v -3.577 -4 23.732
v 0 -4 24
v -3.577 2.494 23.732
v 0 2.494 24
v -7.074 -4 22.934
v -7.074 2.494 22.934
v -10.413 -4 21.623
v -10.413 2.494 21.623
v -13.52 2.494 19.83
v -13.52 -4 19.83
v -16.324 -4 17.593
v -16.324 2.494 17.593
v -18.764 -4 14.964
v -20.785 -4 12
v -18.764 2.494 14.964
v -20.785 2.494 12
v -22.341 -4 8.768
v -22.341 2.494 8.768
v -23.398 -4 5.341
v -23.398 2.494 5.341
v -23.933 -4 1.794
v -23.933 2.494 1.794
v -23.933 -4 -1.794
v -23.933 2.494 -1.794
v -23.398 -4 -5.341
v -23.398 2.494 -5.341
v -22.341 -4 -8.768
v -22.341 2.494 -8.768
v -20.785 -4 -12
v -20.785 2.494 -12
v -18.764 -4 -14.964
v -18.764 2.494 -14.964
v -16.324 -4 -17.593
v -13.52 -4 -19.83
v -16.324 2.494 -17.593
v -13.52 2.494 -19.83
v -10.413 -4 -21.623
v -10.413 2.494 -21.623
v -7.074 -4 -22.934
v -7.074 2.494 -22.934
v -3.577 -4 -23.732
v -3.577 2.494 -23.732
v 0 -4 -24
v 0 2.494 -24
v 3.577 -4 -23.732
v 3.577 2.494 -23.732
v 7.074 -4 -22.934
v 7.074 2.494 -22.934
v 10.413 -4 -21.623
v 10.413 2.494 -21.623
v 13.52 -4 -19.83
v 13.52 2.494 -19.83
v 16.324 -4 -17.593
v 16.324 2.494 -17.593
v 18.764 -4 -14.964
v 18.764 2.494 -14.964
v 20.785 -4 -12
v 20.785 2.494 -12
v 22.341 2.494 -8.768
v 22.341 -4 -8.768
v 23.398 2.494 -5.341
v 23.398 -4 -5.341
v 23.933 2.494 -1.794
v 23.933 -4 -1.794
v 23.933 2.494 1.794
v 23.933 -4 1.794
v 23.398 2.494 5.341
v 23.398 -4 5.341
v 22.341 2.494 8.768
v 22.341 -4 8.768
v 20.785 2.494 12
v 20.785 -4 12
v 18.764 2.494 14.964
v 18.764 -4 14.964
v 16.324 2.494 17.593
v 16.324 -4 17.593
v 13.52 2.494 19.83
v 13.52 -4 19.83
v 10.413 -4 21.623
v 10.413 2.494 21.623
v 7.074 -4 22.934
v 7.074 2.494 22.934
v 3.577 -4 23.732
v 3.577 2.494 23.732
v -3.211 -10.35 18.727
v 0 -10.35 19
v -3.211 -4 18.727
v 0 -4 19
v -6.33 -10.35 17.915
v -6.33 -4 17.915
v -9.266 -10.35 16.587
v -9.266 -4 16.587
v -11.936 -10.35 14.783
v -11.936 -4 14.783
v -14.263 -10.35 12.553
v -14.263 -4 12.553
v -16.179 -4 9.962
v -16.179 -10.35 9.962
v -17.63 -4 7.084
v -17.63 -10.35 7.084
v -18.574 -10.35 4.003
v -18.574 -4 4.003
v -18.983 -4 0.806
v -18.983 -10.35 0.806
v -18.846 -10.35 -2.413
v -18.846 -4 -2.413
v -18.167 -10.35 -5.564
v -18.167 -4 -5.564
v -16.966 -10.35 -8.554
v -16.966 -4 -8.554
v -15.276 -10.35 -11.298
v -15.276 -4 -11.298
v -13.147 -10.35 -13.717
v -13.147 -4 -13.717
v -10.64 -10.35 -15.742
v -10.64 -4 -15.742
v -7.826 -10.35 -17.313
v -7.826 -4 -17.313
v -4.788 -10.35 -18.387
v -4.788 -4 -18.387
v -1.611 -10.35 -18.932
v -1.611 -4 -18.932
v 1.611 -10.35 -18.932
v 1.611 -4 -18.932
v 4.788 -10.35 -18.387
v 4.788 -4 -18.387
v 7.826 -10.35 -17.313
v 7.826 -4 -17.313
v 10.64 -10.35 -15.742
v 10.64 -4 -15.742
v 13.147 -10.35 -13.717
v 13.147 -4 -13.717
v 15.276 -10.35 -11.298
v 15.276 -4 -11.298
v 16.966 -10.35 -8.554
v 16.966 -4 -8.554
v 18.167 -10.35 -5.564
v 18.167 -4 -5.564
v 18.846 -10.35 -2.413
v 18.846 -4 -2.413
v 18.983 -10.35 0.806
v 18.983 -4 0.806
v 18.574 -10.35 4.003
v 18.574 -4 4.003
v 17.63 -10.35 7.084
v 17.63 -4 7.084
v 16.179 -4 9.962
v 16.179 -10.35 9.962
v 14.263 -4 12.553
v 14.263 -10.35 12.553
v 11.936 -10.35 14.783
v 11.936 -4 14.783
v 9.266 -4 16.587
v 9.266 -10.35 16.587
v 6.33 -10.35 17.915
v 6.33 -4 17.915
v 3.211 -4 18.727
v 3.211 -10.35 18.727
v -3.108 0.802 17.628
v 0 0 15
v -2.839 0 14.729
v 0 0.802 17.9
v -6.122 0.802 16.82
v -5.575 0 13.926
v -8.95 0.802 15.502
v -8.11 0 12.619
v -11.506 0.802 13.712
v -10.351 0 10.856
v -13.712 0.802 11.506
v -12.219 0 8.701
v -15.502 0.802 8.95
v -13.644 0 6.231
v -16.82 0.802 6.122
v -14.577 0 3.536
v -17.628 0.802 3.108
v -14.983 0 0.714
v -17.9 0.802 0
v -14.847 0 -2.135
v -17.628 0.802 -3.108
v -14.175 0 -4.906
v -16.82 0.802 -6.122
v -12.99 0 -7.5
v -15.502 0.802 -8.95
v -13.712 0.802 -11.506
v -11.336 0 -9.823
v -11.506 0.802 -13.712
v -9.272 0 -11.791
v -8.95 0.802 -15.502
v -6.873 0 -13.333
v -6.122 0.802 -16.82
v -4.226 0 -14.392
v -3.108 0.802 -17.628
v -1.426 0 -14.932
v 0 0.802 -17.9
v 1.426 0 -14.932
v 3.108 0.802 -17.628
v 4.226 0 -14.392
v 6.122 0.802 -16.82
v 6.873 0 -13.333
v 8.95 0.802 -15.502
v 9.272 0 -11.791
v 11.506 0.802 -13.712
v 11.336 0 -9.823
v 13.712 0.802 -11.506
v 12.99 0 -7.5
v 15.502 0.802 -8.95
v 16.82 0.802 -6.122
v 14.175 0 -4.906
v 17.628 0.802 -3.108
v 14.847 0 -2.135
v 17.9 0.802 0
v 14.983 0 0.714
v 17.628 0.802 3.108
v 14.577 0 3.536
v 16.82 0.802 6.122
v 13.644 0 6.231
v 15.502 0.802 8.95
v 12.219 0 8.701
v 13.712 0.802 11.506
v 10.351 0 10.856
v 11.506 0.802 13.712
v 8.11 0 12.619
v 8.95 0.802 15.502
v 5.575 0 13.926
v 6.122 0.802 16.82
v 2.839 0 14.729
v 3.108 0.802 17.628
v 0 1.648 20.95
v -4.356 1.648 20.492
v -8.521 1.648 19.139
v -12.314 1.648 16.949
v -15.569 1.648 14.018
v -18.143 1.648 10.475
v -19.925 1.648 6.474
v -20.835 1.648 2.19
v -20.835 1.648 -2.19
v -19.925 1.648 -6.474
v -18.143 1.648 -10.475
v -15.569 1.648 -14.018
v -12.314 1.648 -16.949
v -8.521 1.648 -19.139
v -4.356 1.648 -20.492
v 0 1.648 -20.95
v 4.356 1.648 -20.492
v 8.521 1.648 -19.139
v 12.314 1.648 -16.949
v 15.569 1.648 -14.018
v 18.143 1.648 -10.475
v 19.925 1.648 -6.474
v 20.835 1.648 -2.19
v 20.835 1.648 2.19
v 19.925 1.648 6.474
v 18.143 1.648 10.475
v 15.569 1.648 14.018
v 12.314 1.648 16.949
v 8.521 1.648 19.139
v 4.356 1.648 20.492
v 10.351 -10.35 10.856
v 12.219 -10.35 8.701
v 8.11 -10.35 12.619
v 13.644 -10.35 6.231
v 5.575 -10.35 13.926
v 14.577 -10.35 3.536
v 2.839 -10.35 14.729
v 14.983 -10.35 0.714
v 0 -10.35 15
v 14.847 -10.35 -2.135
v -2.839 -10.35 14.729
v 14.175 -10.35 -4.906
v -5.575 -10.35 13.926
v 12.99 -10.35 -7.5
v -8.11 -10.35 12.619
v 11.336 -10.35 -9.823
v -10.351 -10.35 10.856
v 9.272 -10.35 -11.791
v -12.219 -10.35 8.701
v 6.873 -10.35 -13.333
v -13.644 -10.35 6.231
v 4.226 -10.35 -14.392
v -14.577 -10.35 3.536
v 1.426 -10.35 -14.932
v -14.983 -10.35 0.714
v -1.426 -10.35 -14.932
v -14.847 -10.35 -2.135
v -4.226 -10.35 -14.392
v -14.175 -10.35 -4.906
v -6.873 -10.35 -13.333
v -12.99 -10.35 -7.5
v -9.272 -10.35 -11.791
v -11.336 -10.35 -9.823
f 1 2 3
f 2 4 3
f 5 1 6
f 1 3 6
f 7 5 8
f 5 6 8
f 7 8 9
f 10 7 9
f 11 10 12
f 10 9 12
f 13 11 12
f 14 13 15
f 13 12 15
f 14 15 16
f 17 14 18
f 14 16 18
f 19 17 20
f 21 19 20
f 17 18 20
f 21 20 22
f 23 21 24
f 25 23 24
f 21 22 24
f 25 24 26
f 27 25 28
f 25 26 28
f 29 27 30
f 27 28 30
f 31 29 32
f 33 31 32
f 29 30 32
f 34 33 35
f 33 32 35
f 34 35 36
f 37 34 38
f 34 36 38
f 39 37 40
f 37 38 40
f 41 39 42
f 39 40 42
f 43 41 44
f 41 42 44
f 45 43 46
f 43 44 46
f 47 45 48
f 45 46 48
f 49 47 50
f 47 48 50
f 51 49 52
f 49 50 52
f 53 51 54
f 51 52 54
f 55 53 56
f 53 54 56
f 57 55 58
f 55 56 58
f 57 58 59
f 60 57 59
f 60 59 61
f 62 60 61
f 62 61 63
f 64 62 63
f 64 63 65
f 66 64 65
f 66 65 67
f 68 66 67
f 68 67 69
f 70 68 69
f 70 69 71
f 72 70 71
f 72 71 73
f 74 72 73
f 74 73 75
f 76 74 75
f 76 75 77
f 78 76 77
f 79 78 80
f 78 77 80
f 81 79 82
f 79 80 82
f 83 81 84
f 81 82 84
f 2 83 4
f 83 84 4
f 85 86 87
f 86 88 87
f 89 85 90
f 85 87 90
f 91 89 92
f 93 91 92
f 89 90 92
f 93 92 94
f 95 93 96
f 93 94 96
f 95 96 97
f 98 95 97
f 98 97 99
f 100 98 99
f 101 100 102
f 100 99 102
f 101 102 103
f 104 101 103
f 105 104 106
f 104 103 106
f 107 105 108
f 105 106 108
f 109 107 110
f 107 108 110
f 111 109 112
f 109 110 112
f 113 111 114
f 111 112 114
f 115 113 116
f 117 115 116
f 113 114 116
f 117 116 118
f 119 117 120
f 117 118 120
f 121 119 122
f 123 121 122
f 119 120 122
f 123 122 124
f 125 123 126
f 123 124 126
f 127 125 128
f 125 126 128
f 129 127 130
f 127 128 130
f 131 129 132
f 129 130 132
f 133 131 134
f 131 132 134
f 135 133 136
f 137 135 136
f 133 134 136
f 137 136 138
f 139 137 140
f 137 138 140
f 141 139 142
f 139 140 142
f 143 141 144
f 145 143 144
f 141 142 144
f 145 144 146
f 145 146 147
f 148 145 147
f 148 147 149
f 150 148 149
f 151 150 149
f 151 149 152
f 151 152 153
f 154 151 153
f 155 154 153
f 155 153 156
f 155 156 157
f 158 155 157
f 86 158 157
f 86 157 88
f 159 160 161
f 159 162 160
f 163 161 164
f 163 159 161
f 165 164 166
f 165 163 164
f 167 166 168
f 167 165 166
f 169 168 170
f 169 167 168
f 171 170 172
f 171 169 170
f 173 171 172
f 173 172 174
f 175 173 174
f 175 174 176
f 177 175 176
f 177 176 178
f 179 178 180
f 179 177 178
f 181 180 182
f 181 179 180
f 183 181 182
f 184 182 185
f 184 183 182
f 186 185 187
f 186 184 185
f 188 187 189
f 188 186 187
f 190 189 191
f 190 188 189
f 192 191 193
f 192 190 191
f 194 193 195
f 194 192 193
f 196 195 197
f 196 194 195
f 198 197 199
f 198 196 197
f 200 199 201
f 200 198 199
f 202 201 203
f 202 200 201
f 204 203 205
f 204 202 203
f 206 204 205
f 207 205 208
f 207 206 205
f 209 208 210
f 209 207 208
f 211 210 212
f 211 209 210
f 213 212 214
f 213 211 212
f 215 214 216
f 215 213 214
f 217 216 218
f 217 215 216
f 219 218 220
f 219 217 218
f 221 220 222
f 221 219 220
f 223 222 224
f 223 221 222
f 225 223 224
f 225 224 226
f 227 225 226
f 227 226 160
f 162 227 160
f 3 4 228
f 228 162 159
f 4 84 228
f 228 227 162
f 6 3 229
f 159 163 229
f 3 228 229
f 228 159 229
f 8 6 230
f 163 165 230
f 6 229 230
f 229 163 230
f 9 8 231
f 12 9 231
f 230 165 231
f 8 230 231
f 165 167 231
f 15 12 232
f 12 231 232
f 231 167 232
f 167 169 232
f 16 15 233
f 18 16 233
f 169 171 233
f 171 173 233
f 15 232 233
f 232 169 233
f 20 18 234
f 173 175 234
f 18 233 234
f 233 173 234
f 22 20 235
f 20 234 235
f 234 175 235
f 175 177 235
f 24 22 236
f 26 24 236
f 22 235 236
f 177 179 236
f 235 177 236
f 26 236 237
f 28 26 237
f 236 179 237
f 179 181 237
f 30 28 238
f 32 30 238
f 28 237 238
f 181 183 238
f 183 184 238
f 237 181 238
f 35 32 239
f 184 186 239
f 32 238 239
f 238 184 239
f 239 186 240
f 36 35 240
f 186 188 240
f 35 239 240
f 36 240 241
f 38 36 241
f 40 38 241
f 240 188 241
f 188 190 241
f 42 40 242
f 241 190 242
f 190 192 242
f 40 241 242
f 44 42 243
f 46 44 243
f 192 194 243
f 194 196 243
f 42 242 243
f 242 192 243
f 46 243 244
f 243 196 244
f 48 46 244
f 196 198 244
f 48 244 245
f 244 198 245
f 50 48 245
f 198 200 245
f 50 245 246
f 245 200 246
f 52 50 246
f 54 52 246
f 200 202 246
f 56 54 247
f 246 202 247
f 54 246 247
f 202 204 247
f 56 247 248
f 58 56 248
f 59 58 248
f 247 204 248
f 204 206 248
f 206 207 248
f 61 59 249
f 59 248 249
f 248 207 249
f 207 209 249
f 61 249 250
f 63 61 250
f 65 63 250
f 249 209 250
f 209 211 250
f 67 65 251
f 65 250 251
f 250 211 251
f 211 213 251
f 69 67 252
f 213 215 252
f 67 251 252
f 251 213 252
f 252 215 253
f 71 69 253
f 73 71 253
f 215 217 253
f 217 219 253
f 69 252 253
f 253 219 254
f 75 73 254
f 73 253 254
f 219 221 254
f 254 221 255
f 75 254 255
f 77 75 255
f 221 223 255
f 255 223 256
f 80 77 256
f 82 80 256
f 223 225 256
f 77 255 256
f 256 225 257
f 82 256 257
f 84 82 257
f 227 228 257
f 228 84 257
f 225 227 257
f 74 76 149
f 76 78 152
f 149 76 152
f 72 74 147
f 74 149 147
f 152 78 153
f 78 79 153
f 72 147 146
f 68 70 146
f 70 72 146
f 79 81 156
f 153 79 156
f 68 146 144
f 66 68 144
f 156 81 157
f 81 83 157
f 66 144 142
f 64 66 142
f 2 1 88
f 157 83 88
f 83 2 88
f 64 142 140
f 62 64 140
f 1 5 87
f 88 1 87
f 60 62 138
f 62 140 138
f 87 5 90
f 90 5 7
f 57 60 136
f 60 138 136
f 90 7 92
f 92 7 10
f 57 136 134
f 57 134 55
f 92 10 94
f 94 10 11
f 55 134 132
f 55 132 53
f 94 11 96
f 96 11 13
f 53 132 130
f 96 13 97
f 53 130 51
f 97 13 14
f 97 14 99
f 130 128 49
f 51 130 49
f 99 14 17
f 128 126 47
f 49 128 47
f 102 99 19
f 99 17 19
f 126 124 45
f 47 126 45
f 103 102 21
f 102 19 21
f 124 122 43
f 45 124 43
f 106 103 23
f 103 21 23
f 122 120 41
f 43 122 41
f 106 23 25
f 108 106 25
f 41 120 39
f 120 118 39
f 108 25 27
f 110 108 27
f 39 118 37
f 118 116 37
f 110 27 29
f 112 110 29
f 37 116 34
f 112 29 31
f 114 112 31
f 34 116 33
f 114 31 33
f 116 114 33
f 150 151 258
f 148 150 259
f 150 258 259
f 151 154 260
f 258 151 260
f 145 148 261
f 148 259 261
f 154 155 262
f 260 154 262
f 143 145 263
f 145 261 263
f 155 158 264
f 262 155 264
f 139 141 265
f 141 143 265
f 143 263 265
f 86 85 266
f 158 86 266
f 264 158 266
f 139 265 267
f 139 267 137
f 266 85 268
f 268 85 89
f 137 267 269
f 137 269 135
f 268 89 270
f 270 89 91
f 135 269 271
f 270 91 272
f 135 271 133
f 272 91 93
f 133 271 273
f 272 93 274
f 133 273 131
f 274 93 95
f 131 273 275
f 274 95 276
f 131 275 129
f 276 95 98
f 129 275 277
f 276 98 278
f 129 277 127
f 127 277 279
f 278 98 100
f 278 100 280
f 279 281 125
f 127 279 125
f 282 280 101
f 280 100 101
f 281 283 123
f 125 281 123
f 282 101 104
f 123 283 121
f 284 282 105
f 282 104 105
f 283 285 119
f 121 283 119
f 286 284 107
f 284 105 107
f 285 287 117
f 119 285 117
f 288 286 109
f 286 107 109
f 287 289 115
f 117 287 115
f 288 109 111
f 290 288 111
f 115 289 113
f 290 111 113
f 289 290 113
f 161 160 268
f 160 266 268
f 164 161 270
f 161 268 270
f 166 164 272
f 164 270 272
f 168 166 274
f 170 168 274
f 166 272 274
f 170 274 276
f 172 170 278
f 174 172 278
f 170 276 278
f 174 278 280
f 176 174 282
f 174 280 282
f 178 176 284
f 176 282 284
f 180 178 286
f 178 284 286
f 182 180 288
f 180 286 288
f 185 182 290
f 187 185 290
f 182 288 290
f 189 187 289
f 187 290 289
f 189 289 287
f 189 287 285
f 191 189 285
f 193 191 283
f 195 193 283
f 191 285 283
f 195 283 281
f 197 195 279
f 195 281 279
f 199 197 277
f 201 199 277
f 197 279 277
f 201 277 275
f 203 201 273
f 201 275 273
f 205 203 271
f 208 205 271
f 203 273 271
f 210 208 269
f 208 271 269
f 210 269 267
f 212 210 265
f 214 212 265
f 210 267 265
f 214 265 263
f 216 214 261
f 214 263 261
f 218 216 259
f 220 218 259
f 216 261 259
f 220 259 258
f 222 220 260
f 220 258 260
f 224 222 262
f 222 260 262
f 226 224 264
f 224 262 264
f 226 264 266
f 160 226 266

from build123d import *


with BuildPart() as part:
    # Sketch1 → Revolve1 (revolve)
    with BuildSketch(Plane(origin=(0, 0, 0), x_dir=(0, 0, -1), z_dir=(1, 0, 0))):
        with BuildLine():
            Line((-15, 0), (-15, -10.35))
            Line((-15, -10.35), (-19, -10.35))
            Line((-19, -10.35), (-19, -4))
            Line((-19, -4), (-24, -4))
            Line((-24, -4), (-24, 2.493733733))
            Line((-24, 2.493733733), (-17.9, 0.8018))
            add(Edge.make_bspline(
                [(-15, 0), (-15.033336467, 0.009188668), (-15.100017964, 0.027568365), (-15.199979517, 0.055340747), (-15.300021158, 0.082856812), (-15.399978661, 0.110643842), (-15.500021387, 0.138155983), (-15.5999786, 0.165944064), (-15.700021404, 0.193455923), (-15.799978595, 0.22124408), (-15.900021405, 0.24875592), (-15.999978596, 0.276544077), (-16.1000214, 0.304055936), (-16.199978613, 0.331844017), (-16.300021339, 0.359356158), (-16.399978842, 0.387143188), (-16.500020483, 0.414659253), (-16.599982036, 0.442431635), (-16.7, 0.47), (-16.800017964, 0.497568365), (-16.899979517, 0.525340747), (-17.000021158, 0.552856812), (-17.099978661, 0.580643841), (-17.200021386, 0.608155987), (-17.299978604, 0.635944047), (-17.400021386, 0.663455987), (-17.499978661, 0.691243841), (-17.600021158, 0.718756812), (-17.699979517, 0.746540746), (-17.800017964, 0.774068364), (-17.866669801, 0.79255533), (-17.9, 0.8018)],
                knots=[0, 0, 0, 0, 0.034478483, 0.068965823, 0.103444305, 0.137931645, 0.172410128, 0.206897468, 0.241375951, 0.275863291, 0.310341773, 0.344829113, 0.379307596, 0.413794936, 0.448273419, 0.482760759, 0.517239241, 0.551726581, 0.586205064, 0.620683547, 0.655170887, 0.689649369, 0.724136709, 0.758615192, 0.793102532, 0.827581015, 0.862068355, 0.896546837, 0.931034177, 0.96551266, 1, 1, 1, 1], degree=3))
        make_face()
    revolve(axis=Axis((0, 0, 0), (0, -1, 0)))


solid = part.part
